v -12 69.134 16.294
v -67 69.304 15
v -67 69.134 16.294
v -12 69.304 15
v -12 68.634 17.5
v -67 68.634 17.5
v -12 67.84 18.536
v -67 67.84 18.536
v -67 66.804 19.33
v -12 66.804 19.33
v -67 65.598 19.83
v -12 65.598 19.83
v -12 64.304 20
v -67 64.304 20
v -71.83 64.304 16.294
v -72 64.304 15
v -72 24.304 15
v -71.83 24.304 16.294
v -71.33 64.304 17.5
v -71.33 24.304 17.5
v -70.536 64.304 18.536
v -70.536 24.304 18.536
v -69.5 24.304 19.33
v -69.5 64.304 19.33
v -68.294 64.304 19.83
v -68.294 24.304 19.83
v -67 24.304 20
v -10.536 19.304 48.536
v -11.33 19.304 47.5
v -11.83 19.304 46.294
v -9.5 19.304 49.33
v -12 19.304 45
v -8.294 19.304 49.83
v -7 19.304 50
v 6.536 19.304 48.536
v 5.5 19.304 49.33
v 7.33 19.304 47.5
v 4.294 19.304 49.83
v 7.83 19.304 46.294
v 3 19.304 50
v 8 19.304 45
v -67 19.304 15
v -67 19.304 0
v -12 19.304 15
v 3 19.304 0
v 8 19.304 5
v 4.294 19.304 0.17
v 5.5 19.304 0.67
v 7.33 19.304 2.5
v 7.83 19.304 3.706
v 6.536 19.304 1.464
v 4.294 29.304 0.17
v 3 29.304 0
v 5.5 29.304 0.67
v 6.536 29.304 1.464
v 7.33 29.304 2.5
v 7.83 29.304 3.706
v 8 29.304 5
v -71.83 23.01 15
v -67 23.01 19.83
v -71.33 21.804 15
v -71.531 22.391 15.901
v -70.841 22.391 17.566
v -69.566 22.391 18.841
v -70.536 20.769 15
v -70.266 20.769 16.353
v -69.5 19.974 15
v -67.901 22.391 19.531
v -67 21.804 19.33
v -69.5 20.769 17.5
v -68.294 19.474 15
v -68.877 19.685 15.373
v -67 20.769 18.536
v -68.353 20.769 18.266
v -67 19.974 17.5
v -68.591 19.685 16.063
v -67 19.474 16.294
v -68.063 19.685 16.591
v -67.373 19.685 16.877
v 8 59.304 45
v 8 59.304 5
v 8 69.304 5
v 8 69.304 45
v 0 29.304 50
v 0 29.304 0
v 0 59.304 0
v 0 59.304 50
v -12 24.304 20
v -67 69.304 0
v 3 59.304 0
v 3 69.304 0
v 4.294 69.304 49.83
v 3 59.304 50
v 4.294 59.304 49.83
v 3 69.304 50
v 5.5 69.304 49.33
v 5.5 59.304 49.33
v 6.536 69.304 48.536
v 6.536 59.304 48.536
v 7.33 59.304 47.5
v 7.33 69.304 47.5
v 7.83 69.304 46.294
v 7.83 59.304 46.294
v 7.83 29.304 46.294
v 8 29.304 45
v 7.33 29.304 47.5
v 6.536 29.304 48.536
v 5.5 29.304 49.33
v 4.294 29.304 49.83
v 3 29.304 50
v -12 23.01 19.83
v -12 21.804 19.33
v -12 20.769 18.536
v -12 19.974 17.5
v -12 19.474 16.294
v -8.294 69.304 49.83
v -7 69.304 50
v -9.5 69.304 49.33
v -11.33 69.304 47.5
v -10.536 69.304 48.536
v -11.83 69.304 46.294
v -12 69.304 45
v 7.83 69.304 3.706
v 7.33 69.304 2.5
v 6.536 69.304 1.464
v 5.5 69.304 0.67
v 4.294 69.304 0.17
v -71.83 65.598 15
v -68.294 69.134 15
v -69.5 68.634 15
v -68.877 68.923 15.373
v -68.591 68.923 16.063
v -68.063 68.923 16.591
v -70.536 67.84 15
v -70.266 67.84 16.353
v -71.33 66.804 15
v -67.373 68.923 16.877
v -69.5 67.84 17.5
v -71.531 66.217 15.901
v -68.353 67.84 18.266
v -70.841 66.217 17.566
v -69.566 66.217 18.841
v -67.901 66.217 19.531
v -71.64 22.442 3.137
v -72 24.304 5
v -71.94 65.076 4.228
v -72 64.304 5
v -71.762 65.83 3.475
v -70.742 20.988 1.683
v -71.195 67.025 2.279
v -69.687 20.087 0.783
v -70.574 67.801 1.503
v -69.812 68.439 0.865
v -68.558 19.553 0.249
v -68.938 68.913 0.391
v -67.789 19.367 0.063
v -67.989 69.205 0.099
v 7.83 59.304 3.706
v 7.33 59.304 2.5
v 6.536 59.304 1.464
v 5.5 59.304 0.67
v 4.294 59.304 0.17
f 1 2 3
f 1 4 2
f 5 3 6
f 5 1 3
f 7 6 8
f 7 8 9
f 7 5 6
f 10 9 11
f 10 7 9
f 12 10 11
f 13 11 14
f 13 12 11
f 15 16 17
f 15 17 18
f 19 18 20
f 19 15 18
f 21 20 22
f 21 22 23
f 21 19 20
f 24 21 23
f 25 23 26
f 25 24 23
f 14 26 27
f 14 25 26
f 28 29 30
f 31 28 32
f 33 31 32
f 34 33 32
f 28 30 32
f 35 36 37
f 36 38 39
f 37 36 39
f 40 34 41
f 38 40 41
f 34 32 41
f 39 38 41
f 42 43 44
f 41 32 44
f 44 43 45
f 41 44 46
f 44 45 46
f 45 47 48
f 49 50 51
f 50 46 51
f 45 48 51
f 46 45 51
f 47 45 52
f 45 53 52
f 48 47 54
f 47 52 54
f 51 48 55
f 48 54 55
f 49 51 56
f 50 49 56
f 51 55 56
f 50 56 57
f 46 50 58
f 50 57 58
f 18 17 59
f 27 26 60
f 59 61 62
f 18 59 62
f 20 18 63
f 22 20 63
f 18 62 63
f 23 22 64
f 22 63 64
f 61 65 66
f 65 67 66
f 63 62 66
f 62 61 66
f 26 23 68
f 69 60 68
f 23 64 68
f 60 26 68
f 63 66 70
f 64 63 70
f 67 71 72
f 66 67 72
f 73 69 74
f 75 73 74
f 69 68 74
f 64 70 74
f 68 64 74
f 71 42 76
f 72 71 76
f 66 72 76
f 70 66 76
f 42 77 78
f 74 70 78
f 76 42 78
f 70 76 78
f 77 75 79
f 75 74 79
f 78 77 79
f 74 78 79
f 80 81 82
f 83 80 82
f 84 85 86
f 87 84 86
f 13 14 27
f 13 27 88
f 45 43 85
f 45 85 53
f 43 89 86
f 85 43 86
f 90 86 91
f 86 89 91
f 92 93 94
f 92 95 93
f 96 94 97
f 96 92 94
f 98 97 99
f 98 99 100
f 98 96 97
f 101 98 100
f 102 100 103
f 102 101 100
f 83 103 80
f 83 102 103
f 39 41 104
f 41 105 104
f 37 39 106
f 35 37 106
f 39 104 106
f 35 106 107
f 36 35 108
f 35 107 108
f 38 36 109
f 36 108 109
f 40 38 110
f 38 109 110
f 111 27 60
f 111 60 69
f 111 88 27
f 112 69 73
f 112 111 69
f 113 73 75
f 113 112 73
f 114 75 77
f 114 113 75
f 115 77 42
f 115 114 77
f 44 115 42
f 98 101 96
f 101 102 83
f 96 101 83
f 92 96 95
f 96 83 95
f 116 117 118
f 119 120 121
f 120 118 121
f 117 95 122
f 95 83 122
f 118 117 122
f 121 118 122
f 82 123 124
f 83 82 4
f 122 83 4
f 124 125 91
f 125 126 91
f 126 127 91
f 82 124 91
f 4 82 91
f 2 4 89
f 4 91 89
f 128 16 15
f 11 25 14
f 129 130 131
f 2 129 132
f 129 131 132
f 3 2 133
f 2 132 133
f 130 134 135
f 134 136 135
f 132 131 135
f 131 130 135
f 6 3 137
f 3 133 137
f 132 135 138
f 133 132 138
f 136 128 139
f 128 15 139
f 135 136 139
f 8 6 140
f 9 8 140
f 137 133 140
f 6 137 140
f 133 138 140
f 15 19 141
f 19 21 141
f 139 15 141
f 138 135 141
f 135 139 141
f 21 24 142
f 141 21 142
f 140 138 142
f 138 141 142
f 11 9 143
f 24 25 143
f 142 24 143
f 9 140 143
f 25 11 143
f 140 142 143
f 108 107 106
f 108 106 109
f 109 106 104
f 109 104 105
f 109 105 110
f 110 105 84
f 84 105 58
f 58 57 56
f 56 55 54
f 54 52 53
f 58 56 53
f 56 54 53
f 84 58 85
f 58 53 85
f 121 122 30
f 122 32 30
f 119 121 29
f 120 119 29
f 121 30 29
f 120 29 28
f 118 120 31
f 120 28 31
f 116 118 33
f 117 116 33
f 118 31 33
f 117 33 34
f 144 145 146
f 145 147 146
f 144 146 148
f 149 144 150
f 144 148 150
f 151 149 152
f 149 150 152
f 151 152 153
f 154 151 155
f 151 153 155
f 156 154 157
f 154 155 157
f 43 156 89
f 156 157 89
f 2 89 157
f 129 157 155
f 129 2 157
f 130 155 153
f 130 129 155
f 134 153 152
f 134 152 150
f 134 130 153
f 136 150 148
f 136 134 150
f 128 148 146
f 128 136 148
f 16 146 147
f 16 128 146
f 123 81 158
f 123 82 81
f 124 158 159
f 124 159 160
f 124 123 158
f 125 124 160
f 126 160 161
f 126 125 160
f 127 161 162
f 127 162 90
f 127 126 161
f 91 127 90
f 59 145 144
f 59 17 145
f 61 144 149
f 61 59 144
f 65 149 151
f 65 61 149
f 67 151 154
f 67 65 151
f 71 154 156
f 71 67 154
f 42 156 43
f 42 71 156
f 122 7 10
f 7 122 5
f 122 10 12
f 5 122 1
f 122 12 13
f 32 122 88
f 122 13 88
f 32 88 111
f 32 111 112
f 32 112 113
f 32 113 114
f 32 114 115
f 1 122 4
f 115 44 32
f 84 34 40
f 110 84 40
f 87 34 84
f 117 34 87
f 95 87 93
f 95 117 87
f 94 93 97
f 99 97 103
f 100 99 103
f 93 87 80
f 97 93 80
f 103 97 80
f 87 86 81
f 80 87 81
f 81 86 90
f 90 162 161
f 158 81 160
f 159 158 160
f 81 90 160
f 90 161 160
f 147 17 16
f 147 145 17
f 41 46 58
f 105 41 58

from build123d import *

# Parameters (mm, degrees)
F0_W     = 60
F0_H     = 50
F1_DEPTH = 20
F2_DEPTH = 50
F3_R     = 5
F4_R     = 5
F5_R     = 5
F6_R     = 5
F7_R     = 5


with BuildPart() as f1:
    # F0 (on Top) → F1 (new body)
    with BuildSketch(Plane.XY):
        with Locations((-42, 44.3040782763)):
            Rectangle(F0_W, F0_H)
    extrude(amount=F1_DEPTH)

    # F0 (on Top) → F2 (join)
    with BuildSketch(Plane.XY):
        Polygon((8, 69.3040782763), (-12, 69.3040782763), (-12, 19.3040782763), (8, 19.3040782763), (8, 29.3040782763), (0, 29.3040782763), (0, 59.3040782763), (8, 59.3040782763), align=None)
    extrude(amount=F2_DEPTH)

    # F3
    f3_edges = [f1.edges().sort_by_distance(p)[0] for p in [
        (-72, 44.304078, 20),
    ]]
    fillet(f3_edges, radius=F3_R)

    # F4
    f4_edges = [f1.edges().sort_by_distance(p)[0] for p in [
        (-12, 44.304078, 50),
    ]]
    fillet(f4_edges, radius=F4_R)

    # F5
    f5_edges = [f1.edges().sort_by_distance(p)[0] for p in [
        (-72, 69.304078, 7.5),
        (-72, 44.304078, 15),
        (-72, 44.304078, 0),
        (-72, 19.304078, 7.5),
    ]]
    fillet(f5_edges, radius=F5_R)

    # F6
    f6_edges = [f1.edges().sort_by_distance(p)[0] for p in [
        (8, 24.304078, 50),
        (8, 64.304078, 50),
    ]]
    fillet(f6_edges, radius=F6_R)

    # F7
    f7_edges = [f1.edges().sort_by_distance(p)[0] for p in [
        (8, 24.304078, 0),
        (8, 64.304078, 0),
    ]]
    fillet(f7_edges, radius=F7_R)


solid = f1.part
